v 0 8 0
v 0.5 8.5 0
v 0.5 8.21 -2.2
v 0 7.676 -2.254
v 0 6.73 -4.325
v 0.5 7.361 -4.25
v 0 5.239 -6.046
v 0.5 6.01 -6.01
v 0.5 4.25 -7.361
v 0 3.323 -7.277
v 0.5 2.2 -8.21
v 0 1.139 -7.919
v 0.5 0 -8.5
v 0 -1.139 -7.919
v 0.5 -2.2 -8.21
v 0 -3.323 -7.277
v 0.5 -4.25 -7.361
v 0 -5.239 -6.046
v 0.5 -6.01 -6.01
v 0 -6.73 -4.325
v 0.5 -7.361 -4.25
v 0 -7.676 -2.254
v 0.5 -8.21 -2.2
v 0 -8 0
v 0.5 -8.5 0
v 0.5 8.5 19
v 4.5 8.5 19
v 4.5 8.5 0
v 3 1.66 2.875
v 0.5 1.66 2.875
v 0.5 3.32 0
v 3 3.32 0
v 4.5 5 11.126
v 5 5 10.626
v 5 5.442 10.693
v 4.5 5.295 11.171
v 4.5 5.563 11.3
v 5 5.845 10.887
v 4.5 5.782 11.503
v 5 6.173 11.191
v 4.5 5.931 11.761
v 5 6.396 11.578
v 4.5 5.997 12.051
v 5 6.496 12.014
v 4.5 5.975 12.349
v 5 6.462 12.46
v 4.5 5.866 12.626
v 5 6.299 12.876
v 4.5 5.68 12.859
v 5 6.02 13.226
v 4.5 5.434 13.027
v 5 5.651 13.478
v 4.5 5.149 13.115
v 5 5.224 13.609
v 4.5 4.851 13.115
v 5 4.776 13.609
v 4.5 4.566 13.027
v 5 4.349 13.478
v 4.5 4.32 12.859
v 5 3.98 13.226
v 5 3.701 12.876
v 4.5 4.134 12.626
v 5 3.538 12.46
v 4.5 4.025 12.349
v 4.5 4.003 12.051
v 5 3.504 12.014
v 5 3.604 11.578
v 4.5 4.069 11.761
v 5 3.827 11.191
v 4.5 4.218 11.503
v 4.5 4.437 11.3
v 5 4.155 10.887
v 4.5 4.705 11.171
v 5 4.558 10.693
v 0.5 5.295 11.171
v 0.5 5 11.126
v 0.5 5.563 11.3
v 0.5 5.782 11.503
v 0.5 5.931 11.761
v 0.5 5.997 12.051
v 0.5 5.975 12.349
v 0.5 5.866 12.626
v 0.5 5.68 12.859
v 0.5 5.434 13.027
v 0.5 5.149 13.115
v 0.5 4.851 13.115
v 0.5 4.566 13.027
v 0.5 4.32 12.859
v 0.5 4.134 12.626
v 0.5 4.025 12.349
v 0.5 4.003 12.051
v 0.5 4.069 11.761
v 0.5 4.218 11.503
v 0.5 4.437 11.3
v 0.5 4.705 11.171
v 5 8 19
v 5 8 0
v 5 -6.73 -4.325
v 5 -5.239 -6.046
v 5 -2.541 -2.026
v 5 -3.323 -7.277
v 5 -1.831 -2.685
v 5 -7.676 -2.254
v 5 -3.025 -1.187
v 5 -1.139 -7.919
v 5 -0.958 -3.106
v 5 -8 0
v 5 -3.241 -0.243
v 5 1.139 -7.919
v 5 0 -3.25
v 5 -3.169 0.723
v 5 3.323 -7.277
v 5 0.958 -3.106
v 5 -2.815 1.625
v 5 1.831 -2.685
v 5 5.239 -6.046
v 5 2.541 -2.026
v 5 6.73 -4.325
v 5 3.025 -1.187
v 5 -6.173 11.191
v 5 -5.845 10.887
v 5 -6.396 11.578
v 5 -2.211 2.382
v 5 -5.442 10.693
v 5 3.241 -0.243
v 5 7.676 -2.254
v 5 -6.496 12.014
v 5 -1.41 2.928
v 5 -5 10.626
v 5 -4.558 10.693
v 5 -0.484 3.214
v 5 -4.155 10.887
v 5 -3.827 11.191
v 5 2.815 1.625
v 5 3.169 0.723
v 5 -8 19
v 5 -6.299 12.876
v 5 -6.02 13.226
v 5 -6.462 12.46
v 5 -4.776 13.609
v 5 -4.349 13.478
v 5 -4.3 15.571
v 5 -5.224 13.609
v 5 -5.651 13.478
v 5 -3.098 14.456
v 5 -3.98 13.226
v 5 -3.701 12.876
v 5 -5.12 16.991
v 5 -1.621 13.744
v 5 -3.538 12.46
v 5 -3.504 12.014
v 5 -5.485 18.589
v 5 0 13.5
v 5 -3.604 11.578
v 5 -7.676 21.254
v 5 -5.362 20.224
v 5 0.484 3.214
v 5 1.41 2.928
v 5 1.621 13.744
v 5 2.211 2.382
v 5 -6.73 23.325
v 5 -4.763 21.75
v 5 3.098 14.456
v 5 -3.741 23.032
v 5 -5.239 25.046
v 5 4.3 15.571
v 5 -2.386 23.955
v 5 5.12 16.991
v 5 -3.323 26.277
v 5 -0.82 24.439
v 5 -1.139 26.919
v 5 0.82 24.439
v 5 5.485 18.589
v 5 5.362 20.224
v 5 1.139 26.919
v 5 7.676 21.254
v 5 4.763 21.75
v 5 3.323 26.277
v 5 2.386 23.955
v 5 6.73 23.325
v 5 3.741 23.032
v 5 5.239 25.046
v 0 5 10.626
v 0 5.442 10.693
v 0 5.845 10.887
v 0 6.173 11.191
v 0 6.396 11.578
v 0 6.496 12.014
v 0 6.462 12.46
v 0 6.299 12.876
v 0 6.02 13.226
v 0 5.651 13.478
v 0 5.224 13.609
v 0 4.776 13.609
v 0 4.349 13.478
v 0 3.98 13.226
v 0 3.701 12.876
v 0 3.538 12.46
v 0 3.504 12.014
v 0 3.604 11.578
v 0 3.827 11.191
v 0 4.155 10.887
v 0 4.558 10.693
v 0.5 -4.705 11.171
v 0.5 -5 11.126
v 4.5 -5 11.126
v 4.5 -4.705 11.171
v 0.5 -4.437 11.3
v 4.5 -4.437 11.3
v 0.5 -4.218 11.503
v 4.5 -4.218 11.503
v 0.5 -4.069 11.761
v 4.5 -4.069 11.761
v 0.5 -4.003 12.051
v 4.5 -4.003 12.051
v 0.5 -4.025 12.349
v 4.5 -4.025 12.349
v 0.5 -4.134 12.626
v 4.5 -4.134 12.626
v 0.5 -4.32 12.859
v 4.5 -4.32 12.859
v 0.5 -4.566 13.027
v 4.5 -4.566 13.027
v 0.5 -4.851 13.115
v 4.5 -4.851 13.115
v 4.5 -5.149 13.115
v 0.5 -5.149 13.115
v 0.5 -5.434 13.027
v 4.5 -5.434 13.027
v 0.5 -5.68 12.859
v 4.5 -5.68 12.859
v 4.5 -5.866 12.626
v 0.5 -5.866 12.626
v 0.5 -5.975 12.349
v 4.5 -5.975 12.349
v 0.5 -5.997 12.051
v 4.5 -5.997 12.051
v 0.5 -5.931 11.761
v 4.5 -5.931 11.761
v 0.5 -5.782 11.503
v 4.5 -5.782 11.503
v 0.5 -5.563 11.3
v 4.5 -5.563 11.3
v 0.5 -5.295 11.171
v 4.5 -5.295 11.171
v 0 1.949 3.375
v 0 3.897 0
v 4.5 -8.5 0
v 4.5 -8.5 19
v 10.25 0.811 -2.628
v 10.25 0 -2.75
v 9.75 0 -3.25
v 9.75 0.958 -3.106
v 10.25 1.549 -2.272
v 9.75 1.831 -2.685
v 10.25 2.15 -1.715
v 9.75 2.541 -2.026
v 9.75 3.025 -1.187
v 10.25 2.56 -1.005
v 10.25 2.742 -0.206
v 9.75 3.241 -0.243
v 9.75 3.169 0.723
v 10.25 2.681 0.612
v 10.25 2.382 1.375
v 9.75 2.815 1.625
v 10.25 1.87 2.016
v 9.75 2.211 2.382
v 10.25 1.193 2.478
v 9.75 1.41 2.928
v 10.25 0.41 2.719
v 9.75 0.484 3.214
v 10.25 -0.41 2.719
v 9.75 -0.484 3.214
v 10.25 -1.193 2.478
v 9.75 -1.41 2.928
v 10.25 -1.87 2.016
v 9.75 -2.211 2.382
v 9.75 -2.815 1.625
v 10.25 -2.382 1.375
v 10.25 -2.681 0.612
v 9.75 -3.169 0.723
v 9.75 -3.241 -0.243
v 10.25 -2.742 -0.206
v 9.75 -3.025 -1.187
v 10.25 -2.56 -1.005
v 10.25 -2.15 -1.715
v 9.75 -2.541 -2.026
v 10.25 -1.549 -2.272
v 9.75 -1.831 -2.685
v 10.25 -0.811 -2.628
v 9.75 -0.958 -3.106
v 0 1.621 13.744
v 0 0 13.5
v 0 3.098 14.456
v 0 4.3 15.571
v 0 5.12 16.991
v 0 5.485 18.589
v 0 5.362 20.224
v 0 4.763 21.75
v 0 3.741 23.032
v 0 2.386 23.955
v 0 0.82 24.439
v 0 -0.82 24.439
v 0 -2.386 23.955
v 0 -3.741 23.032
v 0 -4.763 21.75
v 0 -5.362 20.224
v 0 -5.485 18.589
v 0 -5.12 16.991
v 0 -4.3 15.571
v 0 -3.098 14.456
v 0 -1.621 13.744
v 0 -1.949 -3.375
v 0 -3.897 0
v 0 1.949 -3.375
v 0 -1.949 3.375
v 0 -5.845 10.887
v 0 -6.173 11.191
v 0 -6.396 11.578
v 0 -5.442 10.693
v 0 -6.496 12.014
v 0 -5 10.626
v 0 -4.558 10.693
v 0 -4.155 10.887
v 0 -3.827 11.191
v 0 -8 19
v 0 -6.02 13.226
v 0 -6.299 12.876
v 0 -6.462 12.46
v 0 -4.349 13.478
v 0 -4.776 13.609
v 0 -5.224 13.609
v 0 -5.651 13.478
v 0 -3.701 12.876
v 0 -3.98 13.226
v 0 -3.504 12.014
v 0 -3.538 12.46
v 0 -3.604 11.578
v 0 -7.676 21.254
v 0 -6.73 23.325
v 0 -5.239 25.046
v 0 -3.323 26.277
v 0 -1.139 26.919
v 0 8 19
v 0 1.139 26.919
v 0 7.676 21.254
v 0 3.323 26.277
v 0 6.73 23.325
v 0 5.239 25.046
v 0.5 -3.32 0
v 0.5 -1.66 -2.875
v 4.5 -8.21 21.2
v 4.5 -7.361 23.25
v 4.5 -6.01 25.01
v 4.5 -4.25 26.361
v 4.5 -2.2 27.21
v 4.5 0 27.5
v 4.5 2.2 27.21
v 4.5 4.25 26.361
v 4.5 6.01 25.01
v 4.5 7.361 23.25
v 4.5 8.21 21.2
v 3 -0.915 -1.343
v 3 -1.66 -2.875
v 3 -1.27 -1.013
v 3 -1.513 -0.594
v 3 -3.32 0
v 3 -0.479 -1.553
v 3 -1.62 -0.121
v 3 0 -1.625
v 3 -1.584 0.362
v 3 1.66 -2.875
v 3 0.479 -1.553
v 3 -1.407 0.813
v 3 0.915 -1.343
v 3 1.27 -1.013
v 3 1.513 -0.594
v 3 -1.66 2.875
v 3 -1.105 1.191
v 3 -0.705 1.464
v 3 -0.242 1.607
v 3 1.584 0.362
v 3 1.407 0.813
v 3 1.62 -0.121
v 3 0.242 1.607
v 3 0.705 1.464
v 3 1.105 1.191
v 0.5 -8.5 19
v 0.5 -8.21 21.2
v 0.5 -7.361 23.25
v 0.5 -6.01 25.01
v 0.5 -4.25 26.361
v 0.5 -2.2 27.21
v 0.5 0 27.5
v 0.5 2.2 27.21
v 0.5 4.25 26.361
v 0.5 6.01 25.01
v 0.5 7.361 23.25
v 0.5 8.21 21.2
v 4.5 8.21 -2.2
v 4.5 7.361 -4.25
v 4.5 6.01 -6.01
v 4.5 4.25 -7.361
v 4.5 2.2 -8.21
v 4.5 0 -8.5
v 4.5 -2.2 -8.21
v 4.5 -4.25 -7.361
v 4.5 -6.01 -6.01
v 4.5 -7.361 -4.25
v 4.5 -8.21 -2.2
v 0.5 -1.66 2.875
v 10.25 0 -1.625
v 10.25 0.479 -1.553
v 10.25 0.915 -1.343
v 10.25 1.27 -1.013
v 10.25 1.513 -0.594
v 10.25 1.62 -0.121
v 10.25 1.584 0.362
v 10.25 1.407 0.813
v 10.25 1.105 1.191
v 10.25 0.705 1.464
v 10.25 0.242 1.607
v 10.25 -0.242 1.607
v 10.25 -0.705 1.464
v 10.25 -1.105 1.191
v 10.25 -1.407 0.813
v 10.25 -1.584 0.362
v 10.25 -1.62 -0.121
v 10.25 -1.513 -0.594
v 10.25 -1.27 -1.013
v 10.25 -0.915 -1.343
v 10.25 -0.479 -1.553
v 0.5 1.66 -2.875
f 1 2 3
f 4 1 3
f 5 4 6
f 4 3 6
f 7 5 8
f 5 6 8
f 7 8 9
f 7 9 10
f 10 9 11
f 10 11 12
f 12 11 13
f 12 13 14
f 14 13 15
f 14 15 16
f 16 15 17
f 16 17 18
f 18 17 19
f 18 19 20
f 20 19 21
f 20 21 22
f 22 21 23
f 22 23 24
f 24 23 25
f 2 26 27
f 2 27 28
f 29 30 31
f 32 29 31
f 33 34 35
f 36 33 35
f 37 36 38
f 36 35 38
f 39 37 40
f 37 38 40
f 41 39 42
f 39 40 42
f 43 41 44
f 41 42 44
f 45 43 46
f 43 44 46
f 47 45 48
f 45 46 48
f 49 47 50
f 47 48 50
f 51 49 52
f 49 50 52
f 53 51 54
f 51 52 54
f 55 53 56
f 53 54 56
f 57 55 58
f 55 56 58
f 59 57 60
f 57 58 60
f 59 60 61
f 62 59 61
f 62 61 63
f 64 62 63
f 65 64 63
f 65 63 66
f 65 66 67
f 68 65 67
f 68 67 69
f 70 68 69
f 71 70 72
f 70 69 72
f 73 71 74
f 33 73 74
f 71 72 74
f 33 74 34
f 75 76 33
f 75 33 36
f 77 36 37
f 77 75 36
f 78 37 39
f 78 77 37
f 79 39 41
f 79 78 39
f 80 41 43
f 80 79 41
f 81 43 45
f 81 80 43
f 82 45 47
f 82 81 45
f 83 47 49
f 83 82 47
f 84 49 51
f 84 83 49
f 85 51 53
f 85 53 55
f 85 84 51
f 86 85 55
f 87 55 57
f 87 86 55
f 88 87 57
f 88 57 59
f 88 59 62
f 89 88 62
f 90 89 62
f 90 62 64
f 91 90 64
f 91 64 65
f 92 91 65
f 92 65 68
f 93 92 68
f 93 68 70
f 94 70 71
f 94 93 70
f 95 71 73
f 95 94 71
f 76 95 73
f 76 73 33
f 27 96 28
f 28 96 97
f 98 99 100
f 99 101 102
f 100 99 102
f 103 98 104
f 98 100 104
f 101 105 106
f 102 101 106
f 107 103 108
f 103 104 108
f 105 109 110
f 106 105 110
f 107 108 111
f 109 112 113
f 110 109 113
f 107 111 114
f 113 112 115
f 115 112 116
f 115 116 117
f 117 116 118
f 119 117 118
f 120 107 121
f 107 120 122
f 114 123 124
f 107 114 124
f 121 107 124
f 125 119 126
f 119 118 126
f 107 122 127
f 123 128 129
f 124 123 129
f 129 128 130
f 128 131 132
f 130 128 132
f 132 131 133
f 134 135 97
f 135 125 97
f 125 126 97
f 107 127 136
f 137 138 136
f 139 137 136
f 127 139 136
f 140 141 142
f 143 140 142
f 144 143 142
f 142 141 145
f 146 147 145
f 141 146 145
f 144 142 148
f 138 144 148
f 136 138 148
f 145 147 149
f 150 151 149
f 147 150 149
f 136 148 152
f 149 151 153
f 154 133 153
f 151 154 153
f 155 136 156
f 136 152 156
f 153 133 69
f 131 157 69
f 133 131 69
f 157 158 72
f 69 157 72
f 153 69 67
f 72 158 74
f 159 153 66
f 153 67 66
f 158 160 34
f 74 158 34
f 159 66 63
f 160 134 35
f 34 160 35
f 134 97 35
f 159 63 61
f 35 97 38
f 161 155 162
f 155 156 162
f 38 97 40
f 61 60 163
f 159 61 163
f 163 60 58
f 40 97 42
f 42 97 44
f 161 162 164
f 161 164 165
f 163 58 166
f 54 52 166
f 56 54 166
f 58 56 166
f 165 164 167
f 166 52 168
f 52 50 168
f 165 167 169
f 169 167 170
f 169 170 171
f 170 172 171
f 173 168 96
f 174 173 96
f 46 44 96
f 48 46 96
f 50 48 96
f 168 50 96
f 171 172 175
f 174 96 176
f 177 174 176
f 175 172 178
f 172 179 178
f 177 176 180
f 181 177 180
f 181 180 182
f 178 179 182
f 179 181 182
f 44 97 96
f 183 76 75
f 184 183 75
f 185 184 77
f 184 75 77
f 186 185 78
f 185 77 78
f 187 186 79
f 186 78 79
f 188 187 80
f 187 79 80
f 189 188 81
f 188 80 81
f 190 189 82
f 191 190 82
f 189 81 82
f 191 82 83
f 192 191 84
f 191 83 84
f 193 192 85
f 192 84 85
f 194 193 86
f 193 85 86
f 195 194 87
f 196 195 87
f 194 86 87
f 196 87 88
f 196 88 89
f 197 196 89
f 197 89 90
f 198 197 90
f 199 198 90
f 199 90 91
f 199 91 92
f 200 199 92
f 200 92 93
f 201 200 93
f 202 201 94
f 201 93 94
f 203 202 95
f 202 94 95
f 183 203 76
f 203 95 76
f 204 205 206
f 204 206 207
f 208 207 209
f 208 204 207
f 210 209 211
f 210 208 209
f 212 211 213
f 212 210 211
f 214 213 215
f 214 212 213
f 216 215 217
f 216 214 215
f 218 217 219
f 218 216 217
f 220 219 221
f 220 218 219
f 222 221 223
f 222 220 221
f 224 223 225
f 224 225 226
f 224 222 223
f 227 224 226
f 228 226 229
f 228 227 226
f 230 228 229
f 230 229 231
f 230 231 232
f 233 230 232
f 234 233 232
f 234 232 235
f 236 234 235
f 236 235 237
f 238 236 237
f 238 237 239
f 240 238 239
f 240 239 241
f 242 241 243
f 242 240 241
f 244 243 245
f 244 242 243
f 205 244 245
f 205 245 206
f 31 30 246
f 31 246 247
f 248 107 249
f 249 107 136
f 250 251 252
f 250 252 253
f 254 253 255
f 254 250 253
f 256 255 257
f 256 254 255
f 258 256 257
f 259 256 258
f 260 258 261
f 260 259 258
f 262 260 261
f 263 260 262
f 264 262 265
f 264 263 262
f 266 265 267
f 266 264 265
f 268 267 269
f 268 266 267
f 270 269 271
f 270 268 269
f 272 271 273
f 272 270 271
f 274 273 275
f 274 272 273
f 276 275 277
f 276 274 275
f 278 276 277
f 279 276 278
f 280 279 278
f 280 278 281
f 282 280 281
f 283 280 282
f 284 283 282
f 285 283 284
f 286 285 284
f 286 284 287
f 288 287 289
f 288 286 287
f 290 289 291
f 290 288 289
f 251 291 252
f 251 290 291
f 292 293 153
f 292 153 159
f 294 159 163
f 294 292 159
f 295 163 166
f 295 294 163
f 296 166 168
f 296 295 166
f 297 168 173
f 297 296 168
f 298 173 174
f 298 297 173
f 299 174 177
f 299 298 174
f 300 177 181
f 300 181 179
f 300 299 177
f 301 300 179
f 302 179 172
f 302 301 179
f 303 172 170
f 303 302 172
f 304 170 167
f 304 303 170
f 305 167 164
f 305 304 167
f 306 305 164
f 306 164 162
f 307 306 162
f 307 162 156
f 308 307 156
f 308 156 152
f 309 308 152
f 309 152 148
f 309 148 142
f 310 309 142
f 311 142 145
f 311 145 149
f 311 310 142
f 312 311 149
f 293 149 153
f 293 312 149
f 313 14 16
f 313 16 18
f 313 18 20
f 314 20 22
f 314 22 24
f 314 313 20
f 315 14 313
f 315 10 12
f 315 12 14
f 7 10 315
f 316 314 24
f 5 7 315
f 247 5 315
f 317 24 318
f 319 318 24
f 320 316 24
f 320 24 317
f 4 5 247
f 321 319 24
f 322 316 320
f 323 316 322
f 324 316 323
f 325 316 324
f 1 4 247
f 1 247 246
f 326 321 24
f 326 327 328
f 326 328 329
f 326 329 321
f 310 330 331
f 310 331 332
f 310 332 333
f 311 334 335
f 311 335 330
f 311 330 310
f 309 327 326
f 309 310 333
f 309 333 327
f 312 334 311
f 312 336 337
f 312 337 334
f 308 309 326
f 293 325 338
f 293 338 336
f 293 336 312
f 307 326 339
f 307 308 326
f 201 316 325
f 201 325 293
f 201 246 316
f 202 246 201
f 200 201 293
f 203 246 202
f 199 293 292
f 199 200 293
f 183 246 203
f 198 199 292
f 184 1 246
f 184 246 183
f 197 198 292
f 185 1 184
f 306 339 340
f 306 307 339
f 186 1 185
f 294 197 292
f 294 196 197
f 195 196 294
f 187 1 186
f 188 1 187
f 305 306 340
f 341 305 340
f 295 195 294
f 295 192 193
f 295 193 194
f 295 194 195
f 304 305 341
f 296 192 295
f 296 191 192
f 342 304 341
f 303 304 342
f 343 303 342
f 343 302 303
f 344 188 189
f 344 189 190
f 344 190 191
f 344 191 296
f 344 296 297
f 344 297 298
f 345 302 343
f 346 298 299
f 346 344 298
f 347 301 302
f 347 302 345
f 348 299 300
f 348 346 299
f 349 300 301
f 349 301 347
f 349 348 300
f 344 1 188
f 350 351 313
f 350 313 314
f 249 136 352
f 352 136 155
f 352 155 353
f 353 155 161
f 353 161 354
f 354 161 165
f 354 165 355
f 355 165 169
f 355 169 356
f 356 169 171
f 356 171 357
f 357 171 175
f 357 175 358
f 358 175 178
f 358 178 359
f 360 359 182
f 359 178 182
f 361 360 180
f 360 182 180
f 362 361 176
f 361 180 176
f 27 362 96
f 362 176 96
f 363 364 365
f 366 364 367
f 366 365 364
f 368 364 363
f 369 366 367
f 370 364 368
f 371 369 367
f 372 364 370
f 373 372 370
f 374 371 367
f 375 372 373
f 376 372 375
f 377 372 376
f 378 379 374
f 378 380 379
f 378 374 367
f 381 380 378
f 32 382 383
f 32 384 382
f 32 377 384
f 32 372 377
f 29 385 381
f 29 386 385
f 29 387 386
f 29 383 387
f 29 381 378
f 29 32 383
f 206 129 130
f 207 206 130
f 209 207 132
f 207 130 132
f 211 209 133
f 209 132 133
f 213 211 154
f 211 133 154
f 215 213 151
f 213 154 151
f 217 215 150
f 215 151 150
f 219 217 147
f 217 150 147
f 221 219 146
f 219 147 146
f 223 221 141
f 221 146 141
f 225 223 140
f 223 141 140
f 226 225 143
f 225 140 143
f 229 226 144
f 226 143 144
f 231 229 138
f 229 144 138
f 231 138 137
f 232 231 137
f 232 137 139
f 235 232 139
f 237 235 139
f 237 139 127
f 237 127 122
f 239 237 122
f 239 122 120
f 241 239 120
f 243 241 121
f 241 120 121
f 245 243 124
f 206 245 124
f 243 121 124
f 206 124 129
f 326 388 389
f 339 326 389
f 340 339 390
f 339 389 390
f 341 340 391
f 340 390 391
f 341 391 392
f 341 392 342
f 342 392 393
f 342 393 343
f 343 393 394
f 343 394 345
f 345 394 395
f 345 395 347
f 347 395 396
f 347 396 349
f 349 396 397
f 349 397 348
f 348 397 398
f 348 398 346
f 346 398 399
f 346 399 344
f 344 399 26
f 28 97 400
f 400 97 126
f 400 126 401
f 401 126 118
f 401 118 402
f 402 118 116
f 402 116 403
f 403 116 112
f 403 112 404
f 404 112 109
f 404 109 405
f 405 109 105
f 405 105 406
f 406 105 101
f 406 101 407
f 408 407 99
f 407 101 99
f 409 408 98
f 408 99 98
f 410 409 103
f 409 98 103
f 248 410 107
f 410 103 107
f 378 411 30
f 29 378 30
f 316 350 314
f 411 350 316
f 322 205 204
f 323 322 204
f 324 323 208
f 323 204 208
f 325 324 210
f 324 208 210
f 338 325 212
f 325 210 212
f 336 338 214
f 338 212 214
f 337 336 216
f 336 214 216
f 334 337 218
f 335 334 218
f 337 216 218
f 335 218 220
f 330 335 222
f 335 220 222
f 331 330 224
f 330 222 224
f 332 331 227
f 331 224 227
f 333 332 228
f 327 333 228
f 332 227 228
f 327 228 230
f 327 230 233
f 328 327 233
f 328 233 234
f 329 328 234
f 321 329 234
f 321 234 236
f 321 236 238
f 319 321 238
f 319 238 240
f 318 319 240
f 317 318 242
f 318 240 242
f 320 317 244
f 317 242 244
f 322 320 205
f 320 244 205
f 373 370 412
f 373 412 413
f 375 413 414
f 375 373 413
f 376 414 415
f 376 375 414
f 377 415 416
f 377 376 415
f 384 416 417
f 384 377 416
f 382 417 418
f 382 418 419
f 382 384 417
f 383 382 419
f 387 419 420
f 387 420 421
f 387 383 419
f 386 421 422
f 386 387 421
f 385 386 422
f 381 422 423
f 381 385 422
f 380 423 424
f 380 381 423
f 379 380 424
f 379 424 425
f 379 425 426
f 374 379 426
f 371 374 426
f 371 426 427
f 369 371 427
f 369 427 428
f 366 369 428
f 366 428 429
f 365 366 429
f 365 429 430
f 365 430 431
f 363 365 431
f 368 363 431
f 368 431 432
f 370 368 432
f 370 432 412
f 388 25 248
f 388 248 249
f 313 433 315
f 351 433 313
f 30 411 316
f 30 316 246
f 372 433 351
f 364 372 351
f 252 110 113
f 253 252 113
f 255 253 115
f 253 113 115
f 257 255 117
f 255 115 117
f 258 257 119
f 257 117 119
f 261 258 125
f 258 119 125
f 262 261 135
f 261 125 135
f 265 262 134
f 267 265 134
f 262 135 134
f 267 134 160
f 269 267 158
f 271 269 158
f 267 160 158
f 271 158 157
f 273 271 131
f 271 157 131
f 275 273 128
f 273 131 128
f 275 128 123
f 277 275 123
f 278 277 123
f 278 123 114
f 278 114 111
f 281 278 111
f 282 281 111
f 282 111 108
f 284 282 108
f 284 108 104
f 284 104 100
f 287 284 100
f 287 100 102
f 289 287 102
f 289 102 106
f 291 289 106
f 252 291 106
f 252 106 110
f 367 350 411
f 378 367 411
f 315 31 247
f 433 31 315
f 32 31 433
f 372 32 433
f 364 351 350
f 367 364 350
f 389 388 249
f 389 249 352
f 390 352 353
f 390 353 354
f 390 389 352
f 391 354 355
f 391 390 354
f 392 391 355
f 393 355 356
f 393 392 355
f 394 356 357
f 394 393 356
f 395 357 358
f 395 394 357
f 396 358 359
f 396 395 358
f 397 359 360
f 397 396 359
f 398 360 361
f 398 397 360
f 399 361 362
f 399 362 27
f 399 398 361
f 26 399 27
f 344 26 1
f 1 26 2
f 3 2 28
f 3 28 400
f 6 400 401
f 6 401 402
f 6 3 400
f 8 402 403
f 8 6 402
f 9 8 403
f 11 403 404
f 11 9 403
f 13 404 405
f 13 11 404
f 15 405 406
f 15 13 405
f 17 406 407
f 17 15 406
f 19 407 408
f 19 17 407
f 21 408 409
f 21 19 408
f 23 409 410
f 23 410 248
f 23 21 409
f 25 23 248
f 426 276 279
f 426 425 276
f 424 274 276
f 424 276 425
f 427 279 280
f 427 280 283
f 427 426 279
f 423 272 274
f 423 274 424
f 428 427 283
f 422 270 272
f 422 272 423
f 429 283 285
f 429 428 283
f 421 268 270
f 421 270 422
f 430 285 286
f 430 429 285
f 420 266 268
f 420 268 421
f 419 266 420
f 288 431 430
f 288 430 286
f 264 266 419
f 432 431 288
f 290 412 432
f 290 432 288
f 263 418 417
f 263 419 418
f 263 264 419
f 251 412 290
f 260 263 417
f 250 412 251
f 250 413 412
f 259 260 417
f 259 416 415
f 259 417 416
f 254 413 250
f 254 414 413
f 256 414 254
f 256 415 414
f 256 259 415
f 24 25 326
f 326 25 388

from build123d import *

# Parameters (mm, degrees)
SKETCH1_R           = 1.625
SKETCH1_R_2         = 5.5
SKETCH1_R_3         = 1
BOSS_EXTRUDE1_DEPTH = 5
SKETCH1_3_R         = 3.25
SKETCH1_3_R_2       = 1.625
BOSS_EXTRUDE2_DEPTH = 10.25
CUT_EXTRUDE1_DEPTH  = 3
CHAMFER2_SIZE       = 0.5


with BuildPart() as part:
    # Sketch1 → Boss-Extrude1 (new body)
    with BuildSketch(Plane(origin=(0, 0, 0), x_dir=(0, 0, -1), z_dir=(1, 0, 0))):
        with BuildLine():
            Line((0, -8.5), (-19, -8.5))
            ThreePointArc((-19, -8.5), (-27.5, 0), (-19, 8.5))
            Line((-19, 8.5), (0, 8.5))
            ThreePointArc((0, 8.5), (8.5, 0), (0, -8.5))
        make_face()
        Circle(SKETCH1_R, mode=Mode.SUBTRACT)
        with Locations((-19, 0)):
            Circle(SKETCH1_R_2, mode=Mode.SUBTRACT)
        with Locations((-12.126136458, -5)):
            Circle(SKETCH1_R_3, mode=Mode.SUBTRACT)
        with Locations((-12.126136458, 5)):
            Circle(SKETCH1_R_3, mode=Mode.SUBTRACT)
    extrude(amount=BOSS_EXTRUDE1_DEPTH)

    # Sketch1<3> → Boss-Extrude2 (add)
    with BuildSketch(Plane(origin=(0, 0, 0), x_dir=(0, 0, -1), z_dir=(1, 0, 0))):
        Circle(SKETCH1_3_R)
        Circle(SKETCH1_3_R_2, mode=Mode.SUBTRACT)
    extrude(amount=BOSS_EXTRUDE2_DEPTH)

    # Sketch2 → Cut-Extrude1 (cut)
    with BuildSketch(Plane.ZY):
        Polygon((0, 3.319764048), (-2.875, 1.659882024), (-2.875, -1.659882024), (0, -3.319764048), (2.875, -1.659882024), (2.875, 1.659882024), align=None)
    extrude(amount=-CUT_EXTRUDE1_DEPTH, mode=Mode.SUBTRACT)

    # Chamfer2
    chamfer2_edges = [part.edges().sort_by_distance(p)[0] for p in [
        (0, 5, 13.126136458),
        (0, -5, 13.126136458),
        (0, 0, -8.5),
        (0, -8.5, 9.5),
        (0, 0, 27.5),
        (0, 8.5, 9.5),
        (5, 8.5, 9.5),
        (5, 0, 27.5),
        (5, -8.5, 9.5),
        (5, 0, -8.5),
        (10.25, 0, 3.25),
        (5, -5, 13.126136458),
        (5, 5, 13.126136458),
        (0, -2.489823036, -1.4375),
        (0, -2.489823036, 1.4375),
        (0, 0, 2.875),
        (0, 2.489823036, 1.4375),
        (0, 2.489823036, -1.4375),
        (0, 0, -2.875),
    ]]
    chamfer(chamfer2_edges, length=CHAMFER2_SIZE)


solid = part.part
